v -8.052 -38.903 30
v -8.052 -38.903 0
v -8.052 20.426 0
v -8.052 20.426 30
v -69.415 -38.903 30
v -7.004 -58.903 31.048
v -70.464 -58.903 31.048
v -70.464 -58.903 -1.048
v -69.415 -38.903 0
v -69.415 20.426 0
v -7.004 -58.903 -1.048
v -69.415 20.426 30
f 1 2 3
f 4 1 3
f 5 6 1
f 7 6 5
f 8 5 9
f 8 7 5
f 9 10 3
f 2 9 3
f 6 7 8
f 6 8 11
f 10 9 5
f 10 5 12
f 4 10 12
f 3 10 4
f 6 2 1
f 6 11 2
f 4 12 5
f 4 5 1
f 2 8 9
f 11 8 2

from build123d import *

# Parameters (mm, degrees)
F0_W      = 61.3636001945
F0_H      = 59.3294538558
F1_DEPTH  = 30
F1_FACE_W = 61.3636001945
F1_FACE_H = 30
F2_DEPTH  = 20
F2_TAPER  = -3


with BuildPart() as f1:
    # F0 (on Top) → F1 (new body)
    with BuildSketch(Plane.XY):
        with Locations((-38.7336541899, -9.2384442687)):
            Rectangle(F0_W, F0_H)
    extrude(amount=F1_DEPTH)

    # F1_face (on face) → F2 (join)
    with BuildSketch(Plane(origin=(-38.7336541899, -38.9031711966, 15), x_dir=(1, 0, 0), z_dir=(0, -1, 0))):
        Rectangle(F1_FACE_W, F1_FACE_H)
    extrude(amount=F2_DEPTH, taper=F2_TAPER)


solid = f1.part
